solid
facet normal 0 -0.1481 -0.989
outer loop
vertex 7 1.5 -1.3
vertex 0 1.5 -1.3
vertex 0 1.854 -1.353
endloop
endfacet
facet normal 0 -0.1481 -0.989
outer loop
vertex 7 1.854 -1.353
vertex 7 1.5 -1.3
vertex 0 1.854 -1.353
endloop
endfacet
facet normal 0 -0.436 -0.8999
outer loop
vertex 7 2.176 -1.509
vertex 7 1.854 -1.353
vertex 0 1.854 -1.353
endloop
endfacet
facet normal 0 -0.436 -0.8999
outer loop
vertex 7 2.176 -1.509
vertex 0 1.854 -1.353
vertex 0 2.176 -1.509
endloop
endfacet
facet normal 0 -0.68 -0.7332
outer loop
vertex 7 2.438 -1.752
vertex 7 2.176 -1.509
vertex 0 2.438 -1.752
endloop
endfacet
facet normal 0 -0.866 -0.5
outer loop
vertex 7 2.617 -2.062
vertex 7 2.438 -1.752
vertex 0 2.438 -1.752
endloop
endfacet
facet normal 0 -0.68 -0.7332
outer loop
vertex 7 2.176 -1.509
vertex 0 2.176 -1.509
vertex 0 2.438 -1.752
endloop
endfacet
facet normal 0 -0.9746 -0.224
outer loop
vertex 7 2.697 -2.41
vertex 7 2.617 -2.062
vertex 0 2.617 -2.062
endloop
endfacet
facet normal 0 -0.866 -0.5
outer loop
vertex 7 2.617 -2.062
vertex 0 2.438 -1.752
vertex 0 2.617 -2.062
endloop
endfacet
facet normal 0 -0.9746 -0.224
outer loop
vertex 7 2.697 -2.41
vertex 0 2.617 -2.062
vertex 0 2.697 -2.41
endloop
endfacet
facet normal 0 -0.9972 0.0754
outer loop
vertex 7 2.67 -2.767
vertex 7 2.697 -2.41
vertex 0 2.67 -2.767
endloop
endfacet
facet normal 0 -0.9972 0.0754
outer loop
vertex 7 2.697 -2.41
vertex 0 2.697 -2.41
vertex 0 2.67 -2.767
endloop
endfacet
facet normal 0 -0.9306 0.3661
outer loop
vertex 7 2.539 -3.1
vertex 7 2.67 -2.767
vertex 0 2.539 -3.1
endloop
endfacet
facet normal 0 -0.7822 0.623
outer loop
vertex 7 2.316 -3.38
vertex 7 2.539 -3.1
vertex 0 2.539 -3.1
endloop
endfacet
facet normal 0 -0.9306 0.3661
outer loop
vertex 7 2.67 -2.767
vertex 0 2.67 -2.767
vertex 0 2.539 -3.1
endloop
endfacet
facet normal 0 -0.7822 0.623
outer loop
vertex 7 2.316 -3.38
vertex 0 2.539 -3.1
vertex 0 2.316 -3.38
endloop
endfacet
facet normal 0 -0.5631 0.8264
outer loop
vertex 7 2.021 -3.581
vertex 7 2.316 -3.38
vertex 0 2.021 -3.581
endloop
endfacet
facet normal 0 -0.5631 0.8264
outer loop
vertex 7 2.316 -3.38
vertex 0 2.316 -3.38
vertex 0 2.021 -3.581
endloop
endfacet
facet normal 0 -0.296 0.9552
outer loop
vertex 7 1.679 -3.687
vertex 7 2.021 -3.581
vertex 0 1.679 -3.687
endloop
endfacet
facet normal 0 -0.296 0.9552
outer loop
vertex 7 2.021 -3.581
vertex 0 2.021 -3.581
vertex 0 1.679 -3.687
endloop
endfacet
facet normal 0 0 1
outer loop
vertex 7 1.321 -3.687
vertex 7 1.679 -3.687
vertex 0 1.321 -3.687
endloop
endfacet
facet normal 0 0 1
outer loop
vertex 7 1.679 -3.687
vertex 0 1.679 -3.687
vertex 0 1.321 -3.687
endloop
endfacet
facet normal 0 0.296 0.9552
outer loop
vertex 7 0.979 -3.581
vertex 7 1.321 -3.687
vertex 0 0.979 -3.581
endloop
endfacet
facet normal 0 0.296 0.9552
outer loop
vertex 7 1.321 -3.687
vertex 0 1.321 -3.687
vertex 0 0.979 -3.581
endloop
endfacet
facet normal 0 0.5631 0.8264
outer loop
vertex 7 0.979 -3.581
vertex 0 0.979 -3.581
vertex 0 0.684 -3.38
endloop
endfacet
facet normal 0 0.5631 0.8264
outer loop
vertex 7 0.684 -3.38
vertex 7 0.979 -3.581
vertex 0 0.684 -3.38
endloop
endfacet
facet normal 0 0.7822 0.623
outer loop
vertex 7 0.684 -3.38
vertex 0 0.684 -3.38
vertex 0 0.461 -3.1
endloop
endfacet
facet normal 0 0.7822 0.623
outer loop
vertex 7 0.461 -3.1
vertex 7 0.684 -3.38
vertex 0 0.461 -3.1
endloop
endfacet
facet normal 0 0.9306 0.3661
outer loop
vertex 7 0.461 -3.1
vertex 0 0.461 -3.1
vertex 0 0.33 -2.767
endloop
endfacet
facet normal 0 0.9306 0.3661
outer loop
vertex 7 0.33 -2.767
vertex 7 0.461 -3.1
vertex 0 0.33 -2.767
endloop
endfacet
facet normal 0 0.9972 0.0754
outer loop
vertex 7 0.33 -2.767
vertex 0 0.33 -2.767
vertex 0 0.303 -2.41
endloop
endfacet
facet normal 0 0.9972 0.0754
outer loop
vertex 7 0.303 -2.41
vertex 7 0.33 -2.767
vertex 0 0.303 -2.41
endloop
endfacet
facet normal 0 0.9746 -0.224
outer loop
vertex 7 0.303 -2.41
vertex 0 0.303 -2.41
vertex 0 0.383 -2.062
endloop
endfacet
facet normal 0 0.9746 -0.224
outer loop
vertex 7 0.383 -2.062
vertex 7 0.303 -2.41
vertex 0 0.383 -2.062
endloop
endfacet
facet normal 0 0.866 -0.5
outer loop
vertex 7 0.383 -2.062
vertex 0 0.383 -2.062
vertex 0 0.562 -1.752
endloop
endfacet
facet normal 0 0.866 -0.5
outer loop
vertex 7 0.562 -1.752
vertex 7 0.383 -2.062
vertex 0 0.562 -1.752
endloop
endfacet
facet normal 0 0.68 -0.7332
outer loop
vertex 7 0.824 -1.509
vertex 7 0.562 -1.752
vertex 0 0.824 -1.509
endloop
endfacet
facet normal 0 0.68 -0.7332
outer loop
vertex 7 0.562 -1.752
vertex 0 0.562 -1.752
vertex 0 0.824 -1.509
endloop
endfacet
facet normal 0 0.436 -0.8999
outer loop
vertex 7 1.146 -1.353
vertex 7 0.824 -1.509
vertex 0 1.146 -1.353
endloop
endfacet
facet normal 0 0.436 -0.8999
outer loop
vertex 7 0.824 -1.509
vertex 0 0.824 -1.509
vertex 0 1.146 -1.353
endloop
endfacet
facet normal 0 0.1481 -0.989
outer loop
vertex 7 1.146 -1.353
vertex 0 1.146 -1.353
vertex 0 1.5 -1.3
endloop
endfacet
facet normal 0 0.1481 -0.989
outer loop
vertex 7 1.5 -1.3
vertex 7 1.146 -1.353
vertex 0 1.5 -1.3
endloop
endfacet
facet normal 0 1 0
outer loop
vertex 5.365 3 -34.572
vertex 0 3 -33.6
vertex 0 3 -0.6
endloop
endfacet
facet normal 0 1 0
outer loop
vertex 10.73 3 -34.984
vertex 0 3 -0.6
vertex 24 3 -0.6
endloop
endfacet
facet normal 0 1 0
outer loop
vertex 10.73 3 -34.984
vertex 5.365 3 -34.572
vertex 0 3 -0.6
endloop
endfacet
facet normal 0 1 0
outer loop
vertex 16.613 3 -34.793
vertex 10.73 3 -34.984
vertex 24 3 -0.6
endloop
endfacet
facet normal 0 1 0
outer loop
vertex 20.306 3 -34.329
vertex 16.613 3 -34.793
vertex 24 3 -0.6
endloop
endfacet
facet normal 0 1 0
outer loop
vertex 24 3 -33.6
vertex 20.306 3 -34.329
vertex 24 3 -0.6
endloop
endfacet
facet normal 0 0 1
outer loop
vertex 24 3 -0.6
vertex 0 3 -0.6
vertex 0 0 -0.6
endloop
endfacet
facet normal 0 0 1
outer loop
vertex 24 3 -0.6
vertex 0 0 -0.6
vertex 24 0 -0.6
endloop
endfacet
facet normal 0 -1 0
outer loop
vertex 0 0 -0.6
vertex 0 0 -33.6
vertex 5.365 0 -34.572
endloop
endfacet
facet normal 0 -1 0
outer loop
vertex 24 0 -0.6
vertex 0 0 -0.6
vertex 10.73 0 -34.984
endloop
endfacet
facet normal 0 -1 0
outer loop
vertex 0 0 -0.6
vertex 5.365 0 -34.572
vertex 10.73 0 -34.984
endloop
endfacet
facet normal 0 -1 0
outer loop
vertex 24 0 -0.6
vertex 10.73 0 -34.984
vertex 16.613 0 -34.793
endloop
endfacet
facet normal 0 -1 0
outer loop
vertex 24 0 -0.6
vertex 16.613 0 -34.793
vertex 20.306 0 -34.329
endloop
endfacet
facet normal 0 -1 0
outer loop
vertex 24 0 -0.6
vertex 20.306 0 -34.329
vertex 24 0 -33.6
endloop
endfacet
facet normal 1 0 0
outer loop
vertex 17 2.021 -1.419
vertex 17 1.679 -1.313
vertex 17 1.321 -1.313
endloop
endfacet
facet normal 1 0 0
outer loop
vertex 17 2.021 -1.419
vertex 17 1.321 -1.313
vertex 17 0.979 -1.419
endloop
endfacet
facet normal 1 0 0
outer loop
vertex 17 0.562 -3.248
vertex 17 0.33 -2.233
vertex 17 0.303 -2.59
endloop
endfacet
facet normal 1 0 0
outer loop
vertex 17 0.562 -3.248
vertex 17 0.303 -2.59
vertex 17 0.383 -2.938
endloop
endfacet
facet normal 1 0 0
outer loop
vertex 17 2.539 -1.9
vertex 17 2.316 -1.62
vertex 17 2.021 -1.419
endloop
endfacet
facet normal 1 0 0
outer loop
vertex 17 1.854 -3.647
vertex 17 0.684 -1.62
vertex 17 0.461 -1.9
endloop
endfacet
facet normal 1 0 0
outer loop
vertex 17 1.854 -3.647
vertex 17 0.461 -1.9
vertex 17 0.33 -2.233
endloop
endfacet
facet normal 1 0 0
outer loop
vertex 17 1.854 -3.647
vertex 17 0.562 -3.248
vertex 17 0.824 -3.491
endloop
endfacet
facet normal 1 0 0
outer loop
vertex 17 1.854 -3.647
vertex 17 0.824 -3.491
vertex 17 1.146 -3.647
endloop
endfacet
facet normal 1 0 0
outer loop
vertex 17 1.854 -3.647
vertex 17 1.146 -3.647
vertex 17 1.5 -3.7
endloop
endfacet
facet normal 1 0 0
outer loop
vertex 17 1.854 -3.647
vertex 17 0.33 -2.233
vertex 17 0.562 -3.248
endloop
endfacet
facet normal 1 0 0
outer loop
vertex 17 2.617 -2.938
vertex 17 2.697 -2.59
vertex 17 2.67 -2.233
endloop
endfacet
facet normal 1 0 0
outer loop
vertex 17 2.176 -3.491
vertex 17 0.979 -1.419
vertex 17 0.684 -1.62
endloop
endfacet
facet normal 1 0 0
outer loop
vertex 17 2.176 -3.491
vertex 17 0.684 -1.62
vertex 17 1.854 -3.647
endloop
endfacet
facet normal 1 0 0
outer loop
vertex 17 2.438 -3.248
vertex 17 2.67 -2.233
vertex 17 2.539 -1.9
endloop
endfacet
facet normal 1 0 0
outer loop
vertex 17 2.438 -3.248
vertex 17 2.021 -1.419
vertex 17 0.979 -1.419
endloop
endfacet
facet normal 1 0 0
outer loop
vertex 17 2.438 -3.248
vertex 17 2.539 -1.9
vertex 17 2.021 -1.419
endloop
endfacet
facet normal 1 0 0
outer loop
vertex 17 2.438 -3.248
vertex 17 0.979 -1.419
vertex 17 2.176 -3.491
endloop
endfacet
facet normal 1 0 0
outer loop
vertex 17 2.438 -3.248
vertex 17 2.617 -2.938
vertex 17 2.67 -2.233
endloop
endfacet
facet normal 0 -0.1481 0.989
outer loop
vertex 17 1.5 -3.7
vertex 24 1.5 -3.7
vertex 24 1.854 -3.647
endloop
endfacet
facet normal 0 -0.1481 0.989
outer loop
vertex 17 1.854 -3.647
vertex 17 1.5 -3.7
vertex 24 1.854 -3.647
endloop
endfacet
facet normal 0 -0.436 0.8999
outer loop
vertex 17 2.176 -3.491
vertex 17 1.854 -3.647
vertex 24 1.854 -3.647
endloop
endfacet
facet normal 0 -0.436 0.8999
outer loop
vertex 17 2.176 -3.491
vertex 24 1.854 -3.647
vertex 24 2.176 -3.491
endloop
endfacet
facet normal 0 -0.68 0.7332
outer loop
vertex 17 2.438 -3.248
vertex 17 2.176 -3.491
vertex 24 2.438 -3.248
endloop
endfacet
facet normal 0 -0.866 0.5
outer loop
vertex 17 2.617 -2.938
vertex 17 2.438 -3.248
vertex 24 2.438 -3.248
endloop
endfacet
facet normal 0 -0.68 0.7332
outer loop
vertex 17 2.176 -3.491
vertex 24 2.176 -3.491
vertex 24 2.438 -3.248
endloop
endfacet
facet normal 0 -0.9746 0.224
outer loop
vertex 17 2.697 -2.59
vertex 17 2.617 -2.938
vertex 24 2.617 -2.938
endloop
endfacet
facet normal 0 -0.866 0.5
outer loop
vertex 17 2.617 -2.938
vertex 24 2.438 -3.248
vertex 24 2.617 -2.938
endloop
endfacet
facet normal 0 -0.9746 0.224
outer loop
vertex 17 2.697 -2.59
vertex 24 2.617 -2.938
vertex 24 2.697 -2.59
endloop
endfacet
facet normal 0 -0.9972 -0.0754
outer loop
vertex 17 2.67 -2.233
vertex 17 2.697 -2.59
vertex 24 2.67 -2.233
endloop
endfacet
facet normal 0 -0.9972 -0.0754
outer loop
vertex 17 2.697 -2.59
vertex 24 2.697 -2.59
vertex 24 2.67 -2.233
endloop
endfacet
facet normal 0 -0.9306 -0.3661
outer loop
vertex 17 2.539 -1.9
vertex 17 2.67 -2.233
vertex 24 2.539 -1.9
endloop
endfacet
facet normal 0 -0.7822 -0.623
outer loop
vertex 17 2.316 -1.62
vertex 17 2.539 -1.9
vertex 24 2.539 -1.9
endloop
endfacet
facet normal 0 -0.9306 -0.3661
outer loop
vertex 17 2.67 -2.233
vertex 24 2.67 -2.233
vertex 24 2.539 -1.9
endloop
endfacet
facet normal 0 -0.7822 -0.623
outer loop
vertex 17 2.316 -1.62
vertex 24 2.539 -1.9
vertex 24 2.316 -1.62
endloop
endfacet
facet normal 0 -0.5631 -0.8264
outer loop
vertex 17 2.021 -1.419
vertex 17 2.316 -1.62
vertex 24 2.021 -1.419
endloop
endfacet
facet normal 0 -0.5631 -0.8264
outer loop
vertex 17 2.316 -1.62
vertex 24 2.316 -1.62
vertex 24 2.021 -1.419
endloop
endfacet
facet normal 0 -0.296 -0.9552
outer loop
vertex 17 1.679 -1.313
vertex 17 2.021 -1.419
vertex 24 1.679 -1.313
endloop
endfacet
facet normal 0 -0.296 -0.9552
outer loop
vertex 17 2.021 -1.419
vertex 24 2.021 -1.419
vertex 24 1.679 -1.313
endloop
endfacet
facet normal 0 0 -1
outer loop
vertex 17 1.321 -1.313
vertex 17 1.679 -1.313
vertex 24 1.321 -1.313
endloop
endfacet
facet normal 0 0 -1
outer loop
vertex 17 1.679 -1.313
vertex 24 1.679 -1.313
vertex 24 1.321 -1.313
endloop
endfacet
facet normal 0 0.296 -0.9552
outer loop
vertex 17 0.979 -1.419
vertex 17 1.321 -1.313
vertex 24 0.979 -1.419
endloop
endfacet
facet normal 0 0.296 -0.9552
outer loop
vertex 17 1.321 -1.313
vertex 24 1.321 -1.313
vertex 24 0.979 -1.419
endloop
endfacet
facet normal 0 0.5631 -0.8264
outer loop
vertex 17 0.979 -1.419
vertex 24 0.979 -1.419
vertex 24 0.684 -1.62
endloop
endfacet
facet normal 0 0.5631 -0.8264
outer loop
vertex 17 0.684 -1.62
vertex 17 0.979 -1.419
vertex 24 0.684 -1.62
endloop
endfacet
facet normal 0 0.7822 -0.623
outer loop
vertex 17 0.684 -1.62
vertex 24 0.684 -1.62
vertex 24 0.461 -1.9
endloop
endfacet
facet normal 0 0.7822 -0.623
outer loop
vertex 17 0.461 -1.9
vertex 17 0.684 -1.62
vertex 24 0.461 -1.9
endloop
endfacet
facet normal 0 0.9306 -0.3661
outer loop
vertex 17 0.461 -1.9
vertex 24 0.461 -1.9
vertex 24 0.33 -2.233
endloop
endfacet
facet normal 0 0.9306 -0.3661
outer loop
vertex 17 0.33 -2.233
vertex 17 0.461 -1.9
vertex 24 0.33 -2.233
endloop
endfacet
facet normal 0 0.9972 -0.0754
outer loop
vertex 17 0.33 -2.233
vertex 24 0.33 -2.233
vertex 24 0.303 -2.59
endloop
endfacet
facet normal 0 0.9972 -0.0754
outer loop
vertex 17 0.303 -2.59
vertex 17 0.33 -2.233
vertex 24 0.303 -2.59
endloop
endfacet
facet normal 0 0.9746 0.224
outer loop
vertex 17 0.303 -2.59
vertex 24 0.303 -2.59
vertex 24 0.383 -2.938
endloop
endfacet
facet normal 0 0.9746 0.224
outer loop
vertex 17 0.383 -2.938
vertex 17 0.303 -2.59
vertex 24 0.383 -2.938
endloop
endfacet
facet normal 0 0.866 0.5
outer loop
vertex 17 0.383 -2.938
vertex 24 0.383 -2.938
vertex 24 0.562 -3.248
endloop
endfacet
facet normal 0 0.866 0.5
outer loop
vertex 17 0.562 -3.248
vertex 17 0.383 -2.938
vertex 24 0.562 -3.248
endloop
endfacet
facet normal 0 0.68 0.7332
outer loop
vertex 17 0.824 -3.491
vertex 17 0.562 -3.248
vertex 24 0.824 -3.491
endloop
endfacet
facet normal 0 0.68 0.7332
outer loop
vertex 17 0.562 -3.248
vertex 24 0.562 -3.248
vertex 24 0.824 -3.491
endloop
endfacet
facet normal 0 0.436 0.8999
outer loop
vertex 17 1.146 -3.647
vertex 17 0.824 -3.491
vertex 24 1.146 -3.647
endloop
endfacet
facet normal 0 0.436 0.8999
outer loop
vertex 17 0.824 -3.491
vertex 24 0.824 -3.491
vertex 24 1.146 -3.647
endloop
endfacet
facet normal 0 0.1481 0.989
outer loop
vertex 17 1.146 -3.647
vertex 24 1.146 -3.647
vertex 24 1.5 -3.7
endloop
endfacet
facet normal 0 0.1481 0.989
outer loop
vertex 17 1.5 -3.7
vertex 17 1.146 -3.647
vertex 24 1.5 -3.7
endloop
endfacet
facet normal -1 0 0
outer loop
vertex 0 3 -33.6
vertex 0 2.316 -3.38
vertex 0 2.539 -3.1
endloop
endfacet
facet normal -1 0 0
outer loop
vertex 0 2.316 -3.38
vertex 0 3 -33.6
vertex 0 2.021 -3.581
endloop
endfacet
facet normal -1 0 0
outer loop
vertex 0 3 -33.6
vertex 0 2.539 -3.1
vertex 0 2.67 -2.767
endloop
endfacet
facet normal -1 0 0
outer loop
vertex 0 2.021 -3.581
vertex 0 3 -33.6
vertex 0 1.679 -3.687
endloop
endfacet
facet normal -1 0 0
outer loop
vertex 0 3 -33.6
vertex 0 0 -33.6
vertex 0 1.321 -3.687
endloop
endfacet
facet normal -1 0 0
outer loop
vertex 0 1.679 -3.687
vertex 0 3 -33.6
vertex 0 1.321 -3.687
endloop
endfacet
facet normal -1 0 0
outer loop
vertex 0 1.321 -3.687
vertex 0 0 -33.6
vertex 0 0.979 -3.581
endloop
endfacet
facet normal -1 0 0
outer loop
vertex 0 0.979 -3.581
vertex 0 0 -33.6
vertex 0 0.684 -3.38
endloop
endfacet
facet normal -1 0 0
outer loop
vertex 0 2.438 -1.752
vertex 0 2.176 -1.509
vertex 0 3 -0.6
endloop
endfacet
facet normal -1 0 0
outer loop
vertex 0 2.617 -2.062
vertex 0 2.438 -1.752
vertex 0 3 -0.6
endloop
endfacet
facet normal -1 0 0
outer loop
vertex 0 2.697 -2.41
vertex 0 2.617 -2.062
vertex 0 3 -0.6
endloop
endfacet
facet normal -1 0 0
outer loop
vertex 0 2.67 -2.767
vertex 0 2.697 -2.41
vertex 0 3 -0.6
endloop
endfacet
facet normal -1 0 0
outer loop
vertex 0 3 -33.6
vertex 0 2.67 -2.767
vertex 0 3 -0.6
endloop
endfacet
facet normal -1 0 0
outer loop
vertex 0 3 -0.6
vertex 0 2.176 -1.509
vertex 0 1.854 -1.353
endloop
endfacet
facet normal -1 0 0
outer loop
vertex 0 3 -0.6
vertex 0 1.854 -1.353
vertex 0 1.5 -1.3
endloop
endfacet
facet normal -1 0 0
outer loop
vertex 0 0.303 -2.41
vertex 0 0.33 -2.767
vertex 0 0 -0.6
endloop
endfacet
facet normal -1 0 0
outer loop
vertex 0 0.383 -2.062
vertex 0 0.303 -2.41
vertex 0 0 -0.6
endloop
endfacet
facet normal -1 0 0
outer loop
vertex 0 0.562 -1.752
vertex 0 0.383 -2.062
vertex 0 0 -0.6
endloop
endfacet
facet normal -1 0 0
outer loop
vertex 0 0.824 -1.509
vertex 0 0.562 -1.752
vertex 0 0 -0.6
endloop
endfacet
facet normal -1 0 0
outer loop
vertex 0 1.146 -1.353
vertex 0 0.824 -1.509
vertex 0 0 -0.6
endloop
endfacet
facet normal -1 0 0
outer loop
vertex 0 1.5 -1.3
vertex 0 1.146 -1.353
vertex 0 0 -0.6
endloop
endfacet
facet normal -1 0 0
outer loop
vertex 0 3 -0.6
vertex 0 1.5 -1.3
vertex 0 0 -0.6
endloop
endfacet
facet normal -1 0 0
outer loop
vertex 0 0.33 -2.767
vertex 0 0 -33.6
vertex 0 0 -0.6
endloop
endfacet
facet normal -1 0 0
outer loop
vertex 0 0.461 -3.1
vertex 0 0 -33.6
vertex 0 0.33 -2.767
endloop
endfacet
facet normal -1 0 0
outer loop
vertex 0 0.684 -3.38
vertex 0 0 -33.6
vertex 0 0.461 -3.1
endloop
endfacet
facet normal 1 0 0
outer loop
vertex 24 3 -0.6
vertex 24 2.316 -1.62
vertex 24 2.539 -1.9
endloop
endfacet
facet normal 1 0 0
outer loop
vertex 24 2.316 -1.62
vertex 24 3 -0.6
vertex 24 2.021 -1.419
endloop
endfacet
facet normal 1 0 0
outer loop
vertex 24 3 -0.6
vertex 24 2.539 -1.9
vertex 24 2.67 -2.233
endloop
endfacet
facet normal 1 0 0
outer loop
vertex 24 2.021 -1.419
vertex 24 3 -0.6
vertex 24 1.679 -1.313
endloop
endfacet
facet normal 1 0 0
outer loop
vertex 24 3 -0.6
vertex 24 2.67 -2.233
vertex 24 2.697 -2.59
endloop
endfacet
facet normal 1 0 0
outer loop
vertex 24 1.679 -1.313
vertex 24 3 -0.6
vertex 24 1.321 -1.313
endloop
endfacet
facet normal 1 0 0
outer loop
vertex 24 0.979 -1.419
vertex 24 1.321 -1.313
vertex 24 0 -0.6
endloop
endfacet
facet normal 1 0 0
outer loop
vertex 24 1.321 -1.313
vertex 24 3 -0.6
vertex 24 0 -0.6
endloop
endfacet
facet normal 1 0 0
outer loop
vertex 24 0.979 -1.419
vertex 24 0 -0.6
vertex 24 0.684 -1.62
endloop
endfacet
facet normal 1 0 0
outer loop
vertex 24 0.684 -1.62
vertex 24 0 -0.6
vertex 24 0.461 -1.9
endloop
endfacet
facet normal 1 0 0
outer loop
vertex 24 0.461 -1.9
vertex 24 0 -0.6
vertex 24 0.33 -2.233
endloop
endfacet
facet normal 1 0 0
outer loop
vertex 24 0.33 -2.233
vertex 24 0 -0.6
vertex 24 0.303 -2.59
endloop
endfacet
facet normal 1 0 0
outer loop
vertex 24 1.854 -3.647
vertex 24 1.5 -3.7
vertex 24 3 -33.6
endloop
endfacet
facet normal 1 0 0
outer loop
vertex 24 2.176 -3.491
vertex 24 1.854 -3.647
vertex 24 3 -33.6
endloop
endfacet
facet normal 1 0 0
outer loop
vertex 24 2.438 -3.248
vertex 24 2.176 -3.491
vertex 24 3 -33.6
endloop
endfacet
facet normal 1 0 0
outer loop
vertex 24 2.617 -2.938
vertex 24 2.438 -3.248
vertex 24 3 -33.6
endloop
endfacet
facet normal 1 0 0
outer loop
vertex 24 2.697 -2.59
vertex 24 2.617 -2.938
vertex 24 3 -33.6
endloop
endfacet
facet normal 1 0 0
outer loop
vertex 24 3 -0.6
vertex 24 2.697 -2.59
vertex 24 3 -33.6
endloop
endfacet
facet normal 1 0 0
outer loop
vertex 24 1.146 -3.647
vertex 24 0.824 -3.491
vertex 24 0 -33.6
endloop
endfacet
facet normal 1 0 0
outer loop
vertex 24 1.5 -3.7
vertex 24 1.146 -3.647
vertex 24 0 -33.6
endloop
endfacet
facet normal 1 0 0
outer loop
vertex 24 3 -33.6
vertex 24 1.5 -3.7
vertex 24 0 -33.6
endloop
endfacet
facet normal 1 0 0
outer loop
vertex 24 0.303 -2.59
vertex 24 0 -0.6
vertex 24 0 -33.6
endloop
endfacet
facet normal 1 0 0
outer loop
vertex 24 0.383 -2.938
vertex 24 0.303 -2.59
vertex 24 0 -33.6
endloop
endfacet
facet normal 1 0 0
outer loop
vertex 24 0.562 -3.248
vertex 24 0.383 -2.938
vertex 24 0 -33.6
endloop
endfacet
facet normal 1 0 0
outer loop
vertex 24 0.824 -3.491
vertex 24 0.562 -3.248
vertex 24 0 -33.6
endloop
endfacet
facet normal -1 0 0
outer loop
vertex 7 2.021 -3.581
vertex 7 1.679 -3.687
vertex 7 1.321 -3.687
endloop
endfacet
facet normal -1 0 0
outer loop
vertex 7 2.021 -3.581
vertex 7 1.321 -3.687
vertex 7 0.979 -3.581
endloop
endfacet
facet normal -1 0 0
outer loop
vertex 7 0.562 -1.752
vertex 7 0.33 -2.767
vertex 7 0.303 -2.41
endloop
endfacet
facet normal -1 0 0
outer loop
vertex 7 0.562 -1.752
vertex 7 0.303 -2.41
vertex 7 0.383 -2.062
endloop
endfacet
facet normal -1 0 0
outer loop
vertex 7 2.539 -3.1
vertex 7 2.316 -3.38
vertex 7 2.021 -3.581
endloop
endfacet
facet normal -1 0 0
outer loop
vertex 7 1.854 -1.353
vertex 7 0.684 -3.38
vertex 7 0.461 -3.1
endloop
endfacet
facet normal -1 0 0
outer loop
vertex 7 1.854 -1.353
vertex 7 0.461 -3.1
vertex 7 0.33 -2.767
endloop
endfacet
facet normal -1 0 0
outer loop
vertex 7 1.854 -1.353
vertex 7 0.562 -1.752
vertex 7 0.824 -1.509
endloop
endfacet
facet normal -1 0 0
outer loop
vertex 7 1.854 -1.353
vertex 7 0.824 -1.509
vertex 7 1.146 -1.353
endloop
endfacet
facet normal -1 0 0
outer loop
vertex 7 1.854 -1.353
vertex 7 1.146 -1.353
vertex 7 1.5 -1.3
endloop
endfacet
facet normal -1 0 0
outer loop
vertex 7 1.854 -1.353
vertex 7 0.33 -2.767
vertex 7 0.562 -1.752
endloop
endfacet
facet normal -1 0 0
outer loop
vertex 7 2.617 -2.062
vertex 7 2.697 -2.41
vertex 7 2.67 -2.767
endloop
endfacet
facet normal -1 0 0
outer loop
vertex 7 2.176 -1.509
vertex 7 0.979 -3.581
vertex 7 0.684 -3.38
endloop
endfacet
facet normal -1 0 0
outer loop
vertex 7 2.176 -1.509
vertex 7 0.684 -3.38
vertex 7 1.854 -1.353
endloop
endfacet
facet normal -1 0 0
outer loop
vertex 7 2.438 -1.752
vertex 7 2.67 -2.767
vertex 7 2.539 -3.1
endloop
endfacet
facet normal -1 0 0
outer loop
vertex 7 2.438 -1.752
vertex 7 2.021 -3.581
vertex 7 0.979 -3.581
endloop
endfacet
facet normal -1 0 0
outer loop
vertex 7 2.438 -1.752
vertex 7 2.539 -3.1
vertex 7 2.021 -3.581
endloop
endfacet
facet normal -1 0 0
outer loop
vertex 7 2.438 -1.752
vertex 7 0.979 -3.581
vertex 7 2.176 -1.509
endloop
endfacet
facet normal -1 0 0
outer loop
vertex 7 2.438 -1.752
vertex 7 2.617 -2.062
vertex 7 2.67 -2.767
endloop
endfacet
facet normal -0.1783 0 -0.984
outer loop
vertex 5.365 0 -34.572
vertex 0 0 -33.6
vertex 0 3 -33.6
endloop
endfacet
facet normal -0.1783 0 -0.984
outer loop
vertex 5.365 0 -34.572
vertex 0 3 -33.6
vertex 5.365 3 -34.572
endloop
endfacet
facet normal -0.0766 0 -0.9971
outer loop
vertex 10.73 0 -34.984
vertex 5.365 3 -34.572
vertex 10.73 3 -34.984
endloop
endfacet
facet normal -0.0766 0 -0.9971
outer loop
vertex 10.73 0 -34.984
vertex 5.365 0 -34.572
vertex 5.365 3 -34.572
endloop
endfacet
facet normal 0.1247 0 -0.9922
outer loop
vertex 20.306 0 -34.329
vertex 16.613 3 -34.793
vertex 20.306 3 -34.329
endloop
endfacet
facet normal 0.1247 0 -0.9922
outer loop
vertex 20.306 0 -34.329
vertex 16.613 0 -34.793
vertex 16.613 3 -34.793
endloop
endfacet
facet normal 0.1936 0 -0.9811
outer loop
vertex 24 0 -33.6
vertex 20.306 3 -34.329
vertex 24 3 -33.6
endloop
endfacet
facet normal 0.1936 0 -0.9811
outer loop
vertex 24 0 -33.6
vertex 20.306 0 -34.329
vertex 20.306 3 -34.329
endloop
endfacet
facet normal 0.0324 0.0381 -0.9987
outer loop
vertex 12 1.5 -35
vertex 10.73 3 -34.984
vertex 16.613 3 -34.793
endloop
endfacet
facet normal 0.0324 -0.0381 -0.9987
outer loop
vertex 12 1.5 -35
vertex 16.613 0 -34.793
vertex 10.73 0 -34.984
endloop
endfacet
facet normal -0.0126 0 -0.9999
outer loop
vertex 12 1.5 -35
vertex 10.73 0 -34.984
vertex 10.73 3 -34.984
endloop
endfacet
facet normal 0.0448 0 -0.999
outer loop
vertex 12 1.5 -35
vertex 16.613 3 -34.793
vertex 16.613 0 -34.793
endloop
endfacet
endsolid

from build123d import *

# Parameters (mm, degrees)
BOSS_EXTRUDE1_DEPTH = 3
SKETCH2_R           = 1.2
CUT_EXTRUDE1_DEPTH  = 7
SKETCH3_R           = 1.2
CUT_EXTRUDE2_DEPTH  = 7
SKETCH4_W           = 24
SKETCH4_H           = 0.6
CUT_EXTRUDE3_DEPTH  = 4.0000001


with BuildPart() as part:
    # Sketch1 → Boss-Extrude1 (new body)
    with BuildSketch(Plane(origin=(0, 0, 0), x_dir=(1, 0, 0), z_dir=(0, 1, 0))):
        with BuildLine():
            Line((0, 0), (24, 0))
            Line((24, 0), (24, 33.6))
            add(Edge.make_bspline(
                [(0, 33.6), (12, 36.4), (24, 33.6)],
                knots=[0, 0, 0, 1, 1, 1], degree=2))
            Line((0, 33.6), (0, 0))
        make_face()
    extrude(amount=BOSS_EXTRUDE1_DEPTH)

    # Sketch2 → Cut-Extrude1 (cut)
    with BuildSketch(Plane(origin=(24, 0, 0), x_dir=(0, 0, -1), z_dir=(1, 0, 0))):
        with Locations((2.5, 1.5)):
            Circle(SKETCH2_R)
    extrude(amount=-CUT_EXTRUDE1_DEPTH, mode=Mode.SUBTRACT)

    # Sketch3 → Cut-Extrude2 (cut)
    with BuildSketch(Plane.ZY):
        with Locations((-2.5, 1.5)):
            Circle(SKETCH3_R)
    extrude(amount=-CUT_EXTRUDE2_DEPTH, mode=Mode.SUBTRACT)

    # Sketch4 → Cut-Extrude3 (cut, through all)
    with BuildSketch(Plane(origin=(0, 3, 0), x_dir=(1, 0, 0), z_dir=(0, 1, 0))):
        with Locations((12, 0.3)):
            Rectangle(SKETCH4_W, SKETCH4_H)
    extrude(amount=-CUT_EXTRUDE3_DEPTH, mode=Mode.SUBTRACT)


solid = part.part
